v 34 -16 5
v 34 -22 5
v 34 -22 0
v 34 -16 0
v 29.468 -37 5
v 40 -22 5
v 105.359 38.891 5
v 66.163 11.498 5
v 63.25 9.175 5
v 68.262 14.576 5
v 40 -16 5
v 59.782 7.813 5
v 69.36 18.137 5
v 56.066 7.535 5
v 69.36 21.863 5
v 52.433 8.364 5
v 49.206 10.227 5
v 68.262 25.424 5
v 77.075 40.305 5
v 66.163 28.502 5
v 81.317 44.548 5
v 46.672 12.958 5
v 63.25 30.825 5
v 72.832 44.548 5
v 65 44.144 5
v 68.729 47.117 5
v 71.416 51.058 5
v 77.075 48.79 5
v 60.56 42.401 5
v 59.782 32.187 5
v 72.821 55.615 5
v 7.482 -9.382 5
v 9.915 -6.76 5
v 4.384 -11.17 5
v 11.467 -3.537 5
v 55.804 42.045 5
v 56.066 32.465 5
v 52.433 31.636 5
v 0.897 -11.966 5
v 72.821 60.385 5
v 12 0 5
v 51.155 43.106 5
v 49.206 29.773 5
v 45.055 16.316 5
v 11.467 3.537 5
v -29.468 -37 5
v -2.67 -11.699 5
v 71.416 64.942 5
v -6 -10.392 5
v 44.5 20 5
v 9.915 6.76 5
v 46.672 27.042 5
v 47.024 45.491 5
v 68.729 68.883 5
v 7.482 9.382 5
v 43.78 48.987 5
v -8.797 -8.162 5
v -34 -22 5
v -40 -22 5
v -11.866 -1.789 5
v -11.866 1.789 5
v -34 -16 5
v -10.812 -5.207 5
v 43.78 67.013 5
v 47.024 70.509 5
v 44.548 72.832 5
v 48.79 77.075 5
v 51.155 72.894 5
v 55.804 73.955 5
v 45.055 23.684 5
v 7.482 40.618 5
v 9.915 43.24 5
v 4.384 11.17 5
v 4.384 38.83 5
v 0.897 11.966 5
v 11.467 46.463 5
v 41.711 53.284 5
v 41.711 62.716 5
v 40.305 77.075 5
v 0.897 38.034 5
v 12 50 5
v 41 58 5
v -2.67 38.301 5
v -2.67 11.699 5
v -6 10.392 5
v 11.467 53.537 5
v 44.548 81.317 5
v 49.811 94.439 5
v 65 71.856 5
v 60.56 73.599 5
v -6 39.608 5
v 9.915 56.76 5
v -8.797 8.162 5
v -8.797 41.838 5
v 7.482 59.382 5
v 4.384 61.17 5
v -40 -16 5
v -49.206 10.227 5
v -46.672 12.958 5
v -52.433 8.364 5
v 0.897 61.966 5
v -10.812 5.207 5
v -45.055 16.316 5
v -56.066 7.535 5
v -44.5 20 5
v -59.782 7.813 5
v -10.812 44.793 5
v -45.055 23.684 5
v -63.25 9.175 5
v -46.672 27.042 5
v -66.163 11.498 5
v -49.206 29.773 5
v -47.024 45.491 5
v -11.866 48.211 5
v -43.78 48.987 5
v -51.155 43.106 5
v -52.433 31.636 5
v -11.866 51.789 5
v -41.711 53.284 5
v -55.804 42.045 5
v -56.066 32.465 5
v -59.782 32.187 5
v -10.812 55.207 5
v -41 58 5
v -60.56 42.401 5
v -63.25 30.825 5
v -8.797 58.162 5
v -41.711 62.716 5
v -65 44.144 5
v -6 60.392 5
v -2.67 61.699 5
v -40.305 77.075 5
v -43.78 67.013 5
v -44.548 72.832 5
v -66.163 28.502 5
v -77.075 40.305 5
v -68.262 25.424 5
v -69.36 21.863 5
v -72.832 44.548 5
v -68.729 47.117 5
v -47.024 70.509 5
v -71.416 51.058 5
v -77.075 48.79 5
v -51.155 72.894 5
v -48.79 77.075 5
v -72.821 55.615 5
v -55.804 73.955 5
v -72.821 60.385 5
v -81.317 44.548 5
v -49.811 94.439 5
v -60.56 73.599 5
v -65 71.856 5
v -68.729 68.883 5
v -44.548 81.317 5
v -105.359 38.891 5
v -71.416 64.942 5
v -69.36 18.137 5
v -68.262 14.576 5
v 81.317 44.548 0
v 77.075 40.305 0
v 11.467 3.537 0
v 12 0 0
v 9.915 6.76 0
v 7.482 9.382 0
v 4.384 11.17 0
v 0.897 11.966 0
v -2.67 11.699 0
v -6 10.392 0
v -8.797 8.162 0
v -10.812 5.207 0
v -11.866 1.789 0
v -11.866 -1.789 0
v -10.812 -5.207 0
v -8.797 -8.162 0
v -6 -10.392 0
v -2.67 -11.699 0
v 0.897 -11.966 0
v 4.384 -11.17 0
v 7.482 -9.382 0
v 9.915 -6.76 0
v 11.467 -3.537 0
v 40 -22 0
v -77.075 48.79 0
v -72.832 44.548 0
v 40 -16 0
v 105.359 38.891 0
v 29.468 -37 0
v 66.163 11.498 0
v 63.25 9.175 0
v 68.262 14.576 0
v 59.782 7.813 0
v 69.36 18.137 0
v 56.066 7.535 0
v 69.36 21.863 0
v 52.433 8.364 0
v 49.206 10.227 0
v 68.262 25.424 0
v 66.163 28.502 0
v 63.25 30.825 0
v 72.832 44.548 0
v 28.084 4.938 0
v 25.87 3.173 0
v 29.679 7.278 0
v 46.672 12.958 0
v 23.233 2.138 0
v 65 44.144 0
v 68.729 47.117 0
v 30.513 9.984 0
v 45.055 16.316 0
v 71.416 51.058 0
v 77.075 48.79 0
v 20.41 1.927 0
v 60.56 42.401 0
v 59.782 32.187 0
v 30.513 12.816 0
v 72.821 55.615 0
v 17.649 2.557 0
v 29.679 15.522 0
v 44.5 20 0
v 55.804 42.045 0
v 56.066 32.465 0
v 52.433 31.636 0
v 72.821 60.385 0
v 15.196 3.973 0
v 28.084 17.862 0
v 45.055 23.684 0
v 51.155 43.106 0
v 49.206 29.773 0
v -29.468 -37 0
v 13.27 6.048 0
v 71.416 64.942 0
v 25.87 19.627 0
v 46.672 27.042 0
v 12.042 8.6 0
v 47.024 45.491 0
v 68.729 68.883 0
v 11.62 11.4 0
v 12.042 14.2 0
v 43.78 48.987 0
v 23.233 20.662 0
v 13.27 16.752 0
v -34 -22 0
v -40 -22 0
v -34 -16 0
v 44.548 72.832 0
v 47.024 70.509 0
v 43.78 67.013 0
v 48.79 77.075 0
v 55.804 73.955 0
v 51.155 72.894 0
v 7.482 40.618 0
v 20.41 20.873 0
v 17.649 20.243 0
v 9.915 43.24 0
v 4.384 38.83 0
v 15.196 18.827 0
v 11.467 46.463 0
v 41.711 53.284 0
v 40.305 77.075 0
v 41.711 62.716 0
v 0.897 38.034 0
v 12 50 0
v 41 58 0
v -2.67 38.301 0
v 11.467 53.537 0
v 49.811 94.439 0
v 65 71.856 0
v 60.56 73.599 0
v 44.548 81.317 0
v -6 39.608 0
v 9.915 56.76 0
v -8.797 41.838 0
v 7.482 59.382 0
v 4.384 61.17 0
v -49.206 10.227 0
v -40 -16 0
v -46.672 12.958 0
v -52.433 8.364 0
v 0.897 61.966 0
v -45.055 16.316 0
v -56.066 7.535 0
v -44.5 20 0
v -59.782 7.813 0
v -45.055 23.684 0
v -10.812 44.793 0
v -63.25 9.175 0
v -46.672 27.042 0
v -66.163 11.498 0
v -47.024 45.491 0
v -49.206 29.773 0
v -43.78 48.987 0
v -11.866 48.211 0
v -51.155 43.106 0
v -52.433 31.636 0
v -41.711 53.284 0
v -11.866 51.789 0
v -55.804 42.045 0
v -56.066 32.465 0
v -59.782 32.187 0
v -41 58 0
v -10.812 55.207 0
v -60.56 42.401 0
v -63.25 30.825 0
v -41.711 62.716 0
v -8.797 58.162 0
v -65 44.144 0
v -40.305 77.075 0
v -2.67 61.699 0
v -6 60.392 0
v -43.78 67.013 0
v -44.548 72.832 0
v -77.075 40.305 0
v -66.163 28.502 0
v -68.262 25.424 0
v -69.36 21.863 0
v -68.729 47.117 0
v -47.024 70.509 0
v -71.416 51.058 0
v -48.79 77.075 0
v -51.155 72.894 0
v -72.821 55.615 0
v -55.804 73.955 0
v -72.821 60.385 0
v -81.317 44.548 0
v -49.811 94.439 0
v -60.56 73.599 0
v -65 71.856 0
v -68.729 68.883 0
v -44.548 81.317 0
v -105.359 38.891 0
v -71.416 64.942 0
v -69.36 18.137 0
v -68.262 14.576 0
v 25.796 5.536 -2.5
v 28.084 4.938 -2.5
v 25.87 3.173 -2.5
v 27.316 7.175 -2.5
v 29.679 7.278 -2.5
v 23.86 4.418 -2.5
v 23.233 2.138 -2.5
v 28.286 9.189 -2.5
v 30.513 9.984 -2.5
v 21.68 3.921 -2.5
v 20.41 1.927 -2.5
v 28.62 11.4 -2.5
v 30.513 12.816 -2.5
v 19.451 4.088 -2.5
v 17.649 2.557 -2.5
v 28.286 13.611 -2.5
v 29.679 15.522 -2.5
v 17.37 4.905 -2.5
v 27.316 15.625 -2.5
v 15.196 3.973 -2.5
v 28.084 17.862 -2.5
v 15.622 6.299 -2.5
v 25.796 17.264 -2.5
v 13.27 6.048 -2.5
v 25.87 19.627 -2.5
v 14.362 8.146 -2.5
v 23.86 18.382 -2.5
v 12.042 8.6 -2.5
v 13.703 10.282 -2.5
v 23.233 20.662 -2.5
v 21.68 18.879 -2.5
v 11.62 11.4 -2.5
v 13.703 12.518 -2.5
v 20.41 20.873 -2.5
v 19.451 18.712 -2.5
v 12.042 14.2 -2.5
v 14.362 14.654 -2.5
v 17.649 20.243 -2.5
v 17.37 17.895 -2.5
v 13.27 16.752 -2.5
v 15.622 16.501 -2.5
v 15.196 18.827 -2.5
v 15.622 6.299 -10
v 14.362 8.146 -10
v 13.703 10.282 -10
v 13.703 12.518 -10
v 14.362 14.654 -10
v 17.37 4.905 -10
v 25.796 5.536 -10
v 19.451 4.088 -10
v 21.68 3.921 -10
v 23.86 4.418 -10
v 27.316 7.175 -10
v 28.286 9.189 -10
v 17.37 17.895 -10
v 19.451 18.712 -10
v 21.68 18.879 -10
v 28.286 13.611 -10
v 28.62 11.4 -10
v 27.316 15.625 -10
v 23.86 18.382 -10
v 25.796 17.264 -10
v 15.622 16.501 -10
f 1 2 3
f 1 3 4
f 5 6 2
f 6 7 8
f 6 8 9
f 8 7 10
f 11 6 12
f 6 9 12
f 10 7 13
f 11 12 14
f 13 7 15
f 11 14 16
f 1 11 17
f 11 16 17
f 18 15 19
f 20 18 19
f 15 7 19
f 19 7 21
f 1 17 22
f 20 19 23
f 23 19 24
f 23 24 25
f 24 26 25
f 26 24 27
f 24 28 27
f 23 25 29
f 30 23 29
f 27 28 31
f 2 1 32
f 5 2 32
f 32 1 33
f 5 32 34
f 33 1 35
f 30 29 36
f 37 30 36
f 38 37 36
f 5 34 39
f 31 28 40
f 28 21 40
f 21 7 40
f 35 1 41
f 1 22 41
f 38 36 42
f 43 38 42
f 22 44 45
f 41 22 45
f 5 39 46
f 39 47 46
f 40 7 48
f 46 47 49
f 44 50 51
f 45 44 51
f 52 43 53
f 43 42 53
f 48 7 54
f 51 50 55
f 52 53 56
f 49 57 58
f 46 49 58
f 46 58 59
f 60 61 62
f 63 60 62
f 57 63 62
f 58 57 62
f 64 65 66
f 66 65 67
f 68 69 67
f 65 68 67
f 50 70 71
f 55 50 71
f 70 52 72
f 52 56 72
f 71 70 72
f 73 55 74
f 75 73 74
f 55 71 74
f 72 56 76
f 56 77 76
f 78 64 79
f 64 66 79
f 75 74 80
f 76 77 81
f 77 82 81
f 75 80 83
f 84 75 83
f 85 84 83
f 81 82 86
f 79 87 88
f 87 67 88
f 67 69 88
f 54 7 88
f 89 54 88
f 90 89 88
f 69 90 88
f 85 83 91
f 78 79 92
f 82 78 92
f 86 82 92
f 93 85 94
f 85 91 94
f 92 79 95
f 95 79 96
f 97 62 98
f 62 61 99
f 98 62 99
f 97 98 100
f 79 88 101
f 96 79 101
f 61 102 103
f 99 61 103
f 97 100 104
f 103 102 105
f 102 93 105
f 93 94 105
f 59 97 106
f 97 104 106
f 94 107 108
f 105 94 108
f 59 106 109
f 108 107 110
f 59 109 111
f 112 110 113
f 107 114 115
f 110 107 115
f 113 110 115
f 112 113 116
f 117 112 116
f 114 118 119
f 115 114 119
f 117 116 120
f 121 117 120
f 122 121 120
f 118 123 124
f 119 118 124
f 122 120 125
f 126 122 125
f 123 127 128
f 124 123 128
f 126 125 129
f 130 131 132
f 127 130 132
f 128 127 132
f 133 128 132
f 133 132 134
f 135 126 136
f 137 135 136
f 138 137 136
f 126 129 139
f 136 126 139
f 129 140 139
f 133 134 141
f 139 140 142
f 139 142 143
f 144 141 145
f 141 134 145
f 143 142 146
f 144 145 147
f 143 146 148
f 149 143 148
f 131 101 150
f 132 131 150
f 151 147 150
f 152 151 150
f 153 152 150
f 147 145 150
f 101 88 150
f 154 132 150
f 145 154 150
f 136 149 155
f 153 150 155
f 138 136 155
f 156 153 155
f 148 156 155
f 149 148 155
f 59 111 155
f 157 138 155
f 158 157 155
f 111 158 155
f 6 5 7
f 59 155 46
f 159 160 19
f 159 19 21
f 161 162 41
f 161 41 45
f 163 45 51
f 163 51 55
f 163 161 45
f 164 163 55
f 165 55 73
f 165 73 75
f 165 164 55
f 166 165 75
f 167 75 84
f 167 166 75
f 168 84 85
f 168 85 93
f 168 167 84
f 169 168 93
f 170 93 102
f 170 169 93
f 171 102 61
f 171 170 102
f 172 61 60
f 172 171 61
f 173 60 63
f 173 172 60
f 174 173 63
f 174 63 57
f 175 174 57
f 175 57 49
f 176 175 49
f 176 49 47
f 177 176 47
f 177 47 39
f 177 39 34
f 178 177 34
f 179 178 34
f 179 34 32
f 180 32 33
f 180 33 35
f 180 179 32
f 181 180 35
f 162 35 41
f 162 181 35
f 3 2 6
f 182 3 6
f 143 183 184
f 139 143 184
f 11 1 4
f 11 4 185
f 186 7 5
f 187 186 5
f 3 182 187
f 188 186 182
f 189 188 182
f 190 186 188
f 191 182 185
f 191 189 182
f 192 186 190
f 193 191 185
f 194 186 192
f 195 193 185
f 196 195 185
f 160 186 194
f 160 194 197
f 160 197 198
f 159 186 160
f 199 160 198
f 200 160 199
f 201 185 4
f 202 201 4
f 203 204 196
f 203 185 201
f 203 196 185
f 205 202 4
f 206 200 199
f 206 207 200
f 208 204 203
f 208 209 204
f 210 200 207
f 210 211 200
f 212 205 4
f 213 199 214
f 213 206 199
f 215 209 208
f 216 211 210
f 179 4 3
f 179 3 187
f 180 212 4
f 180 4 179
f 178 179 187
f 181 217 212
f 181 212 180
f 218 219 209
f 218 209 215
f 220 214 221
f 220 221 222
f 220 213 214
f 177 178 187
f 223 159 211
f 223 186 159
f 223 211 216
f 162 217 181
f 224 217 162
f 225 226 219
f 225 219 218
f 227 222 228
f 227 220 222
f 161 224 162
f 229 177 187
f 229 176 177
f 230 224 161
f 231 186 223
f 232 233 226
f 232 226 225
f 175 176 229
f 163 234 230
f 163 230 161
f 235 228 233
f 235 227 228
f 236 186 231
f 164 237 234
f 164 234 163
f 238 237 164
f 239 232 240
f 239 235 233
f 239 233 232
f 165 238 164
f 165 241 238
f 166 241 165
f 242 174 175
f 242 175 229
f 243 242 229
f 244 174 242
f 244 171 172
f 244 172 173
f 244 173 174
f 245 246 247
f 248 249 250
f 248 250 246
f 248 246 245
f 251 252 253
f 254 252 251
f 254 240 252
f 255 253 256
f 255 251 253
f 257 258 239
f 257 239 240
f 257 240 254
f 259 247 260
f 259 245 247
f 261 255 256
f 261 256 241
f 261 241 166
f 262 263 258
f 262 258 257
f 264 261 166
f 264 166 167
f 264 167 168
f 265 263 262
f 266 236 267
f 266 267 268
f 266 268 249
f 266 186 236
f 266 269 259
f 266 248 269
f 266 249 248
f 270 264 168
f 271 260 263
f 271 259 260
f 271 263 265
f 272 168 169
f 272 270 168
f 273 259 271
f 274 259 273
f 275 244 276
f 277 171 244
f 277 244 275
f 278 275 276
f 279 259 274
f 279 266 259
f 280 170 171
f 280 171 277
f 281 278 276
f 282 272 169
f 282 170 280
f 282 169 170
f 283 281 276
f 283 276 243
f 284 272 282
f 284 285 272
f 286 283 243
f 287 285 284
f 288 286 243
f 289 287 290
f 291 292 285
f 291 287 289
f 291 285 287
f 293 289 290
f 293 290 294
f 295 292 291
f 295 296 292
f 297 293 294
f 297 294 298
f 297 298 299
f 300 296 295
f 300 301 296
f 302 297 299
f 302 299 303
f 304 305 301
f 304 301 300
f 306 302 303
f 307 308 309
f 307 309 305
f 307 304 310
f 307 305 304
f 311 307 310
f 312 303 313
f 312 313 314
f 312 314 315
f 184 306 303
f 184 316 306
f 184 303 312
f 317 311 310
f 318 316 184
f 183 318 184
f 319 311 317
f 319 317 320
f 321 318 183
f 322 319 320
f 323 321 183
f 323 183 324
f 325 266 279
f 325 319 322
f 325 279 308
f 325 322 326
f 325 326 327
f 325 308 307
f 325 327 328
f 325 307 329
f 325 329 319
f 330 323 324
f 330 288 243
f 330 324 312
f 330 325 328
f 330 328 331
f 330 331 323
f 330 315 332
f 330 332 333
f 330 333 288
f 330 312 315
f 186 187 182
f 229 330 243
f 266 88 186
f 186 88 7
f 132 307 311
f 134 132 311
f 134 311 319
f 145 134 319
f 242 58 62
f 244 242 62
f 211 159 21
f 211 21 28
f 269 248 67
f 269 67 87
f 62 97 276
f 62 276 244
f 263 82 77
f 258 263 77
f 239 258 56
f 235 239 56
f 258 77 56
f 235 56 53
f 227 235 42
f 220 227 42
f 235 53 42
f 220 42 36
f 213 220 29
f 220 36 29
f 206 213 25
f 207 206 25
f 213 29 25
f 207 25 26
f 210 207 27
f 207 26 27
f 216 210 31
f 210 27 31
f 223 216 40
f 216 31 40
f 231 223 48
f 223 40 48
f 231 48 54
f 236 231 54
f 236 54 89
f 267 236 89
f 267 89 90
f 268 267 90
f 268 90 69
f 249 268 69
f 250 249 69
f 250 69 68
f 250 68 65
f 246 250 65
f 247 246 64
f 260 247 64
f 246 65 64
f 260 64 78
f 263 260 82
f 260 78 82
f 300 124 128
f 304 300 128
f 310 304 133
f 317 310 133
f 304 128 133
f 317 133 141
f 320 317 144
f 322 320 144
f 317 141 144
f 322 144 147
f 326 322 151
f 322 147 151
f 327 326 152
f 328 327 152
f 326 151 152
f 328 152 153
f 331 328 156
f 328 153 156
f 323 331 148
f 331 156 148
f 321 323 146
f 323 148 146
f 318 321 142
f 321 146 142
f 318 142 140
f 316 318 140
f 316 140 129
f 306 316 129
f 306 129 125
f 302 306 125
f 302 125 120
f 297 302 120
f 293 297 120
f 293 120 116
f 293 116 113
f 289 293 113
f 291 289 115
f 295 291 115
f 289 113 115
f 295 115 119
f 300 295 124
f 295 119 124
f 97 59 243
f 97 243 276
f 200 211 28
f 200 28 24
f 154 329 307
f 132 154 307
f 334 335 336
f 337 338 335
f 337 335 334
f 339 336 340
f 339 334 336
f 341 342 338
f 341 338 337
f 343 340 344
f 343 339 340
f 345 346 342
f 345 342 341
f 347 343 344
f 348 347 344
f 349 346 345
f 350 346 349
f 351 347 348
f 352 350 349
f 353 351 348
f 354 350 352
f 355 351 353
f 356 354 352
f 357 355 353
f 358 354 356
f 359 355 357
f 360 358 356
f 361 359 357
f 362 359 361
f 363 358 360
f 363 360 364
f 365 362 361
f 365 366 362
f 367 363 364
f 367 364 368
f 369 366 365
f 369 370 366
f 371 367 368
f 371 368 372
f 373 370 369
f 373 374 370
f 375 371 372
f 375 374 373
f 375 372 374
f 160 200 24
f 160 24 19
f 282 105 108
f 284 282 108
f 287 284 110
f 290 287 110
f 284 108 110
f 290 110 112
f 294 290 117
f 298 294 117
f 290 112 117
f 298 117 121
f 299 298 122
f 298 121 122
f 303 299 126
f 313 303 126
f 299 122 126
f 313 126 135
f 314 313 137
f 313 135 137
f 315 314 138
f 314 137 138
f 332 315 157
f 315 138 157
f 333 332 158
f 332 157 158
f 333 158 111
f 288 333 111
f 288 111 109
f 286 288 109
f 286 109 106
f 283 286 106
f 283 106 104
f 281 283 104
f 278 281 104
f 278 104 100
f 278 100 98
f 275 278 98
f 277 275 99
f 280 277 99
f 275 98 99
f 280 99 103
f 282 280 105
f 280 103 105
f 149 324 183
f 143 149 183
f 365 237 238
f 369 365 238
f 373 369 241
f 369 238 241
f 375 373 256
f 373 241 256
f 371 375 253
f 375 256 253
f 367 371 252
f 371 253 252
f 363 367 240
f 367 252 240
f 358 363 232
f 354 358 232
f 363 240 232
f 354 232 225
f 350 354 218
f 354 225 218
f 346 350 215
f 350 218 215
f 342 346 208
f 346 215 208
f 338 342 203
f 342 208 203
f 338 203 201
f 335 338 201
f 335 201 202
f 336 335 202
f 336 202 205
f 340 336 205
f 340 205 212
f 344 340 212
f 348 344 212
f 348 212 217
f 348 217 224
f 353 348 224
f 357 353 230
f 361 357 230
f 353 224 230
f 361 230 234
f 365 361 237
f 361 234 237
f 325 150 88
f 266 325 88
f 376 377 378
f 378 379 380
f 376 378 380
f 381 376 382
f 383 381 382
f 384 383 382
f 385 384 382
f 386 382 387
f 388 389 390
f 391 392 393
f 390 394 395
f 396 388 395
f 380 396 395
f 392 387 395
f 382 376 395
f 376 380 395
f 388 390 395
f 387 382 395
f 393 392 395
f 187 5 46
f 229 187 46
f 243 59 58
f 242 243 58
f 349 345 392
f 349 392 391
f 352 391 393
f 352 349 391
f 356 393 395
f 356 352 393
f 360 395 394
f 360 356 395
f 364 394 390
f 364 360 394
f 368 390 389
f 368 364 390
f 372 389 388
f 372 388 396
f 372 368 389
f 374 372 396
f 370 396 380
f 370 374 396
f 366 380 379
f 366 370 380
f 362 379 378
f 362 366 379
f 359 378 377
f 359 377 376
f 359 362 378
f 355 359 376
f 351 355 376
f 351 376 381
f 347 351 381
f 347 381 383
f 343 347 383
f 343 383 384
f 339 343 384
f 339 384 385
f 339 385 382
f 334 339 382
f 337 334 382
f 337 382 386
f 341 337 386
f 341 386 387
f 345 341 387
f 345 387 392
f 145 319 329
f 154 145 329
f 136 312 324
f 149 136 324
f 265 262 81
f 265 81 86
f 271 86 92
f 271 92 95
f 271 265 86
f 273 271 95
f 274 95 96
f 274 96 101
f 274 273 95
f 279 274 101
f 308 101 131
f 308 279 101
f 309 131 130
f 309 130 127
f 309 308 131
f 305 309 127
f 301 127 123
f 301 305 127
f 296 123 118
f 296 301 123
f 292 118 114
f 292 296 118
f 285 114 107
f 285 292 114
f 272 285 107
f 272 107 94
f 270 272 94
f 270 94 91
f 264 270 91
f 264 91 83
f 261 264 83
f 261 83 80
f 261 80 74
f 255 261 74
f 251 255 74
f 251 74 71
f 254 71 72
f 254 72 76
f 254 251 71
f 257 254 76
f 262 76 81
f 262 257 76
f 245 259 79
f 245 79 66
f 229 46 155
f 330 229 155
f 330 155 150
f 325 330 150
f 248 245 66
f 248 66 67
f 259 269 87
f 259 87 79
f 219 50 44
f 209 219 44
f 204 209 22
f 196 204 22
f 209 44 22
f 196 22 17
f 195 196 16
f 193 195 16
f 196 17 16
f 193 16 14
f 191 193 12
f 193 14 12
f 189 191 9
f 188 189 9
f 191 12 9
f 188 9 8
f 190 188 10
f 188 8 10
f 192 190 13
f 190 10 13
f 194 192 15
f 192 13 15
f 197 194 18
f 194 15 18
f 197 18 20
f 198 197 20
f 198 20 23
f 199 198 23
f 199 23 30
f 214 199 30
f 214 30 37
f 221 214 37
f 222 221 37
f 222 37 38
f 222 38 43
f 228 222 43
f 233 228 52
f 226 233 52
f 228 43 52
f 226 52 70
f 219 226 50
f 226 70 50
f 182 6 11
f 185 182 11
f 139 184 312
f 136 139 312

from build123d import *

# Parameters (mm, degrees)
SKETCH3_R           = 12
BOSS_EXTRUDE1_DEPTH = 5
BOSS_EXTRUDE2_DEPTH = 5
SKETCH6_R           = 16
SKETCH6_R_2         = 12.5
SKETCH6_W           = 6
SKETCH6_H           = 6
CUT_EXTRUDE1_DEPTH  = 5
SKETCH7_R           = 7.5
BOSS_EXTRUDE3_DEPTH = 10
SKETCH8_R           = 9.5
SKETCH8_R_2         = 7.5
BOSS_EXTRUDE4_DEPTH = 2.5


with BuildPart() as part:
    # Sketch3 → Boss-Extrude1 (new body)
    with BuildSketch(Plane.XY):
        Polygon((-77.781745931, 49.497474683), (-49.497474683, 77.781745931), (-43.840620434, 83.43860018), (43.840620434, 83.43860018), (49.497474683, 77.781745931), (77.781745931, 49.497474683), (88.388347648, 38.890872965), (27.497474683, -22), (-27.497474683, -22), (-88.388347648, 38.890872965), align=None)
        Circle(SKETCH3_R, mode=Mode.SUBTRACT)
        with Locations((0, 50)):
            Circle(SKETCH3_R, mode=Mode.SUBTRACT)
        Polygon((-81.317279836, 44.547727215), (-77.074639149, 48.790367902), (-72.831998462, 44.547727215), (-77.074639149, 40.305086528), align=None, mode=Mode.SUBTRACT)
        Polygon((-48.790367902, 77.074639149), (-44.547727215, 81.317279836), (-40.305086528, 77.074639149), (-44.547727215, 72.831998462), align=None, mode=Mode.SUBTRACT)
        Polygon((40.305086528, 77.074639149), (44.547727215, 72.831998462), (48.790367902, 77.074639149), (44.547727215, 81.317279836), align=None, mode=Mode.SUBTRACT)
        Polygon((72.831998462, 44.547727215), (77.074639149, 40.305086528), (81.317279836, 44.547727215), (77.074639149, 48.790367902), align=None, mode=Mode.SUBTRACT)
    extrude(amount=BOSS_EXTRUDE1_DEPTH)

    # Sketch5 → Boss-Extrude2 (add)
    with BuildSketch(Plane.XY.offset(5)):
        Polygon((-105.358910397, 38.890872965), (-49.811183182, 94.43860018), (49.811183182, 94.43860018), (105.358910397, 38.890872965), (29.468037432, -37), (-29.468037432, -37), align=None)
        Polygon((-43.840620434, 83.43860018), (-88.388347648, 38.890872965), (-27.497474683, -22), (27.497474683, -22), (88.388347648, 38.890872965), (43.840620434, 83.43860018), align=None, mode=Mode.SUBTRACT)
    extrude(amount=-BOSS_EXTRUDE2_DEPTH)

    # Sketch6 → Cut-Extrude1 (cut)
    with BuildSketch(Plane.XY.offset(5)):
        with Locations((-57, 58)):
            Circle(SKETCH6_R)
        with Locations((-57, 20)):
            Circle(SKETCH6_R_2)
        with Locations(Location((57, 20, 0), (0, 0, 180))):
            Circle(SKETCH6_R_2)
        with Locations(Location((57, 58, 0), (0, 0, 180))):
            Circle(SKETCH6_R)
        with Locations((-37, -19)):
            Rectangle(SKETCH6_W, SKETCH6_H)
        with Locations((37, -19)):
            Rectangle(SKETCH6_W, SKETCH6_H)
    extrude(amount=-CUT_EXTRUDE1_DEPTH, mode=Mode.SUBTRACT)

    # Sketch7 → Boss-Extrude3 (add)
    with BuildSketch(Plane.XY):
        with Locations((21.11953, 11.4)):
            Circle(SKETCH7_R)
    extrude(amount=-BOSS_EXTRUDE3_DEPTH)

    # Sketch8 → Boss-Extrude4 (add)
    with BuildSketch(Plane(origin=(0, 0, 0), x_dir=(-1, 0, 0), z_dir=(0, 0, -1))):
        with Locations((-21.11953, 11.4)):
            Circle(SKETCH8_R)
        with Locations(Location((-21.11953, 11.4, 0), (0, 0, 180))):
            Circle(SKETCH8_R_2, mode=Mode.SUBTRACT)
    extrude(amount=BOSS_EXTRUDE4_DEPTH)


solid = part.part
